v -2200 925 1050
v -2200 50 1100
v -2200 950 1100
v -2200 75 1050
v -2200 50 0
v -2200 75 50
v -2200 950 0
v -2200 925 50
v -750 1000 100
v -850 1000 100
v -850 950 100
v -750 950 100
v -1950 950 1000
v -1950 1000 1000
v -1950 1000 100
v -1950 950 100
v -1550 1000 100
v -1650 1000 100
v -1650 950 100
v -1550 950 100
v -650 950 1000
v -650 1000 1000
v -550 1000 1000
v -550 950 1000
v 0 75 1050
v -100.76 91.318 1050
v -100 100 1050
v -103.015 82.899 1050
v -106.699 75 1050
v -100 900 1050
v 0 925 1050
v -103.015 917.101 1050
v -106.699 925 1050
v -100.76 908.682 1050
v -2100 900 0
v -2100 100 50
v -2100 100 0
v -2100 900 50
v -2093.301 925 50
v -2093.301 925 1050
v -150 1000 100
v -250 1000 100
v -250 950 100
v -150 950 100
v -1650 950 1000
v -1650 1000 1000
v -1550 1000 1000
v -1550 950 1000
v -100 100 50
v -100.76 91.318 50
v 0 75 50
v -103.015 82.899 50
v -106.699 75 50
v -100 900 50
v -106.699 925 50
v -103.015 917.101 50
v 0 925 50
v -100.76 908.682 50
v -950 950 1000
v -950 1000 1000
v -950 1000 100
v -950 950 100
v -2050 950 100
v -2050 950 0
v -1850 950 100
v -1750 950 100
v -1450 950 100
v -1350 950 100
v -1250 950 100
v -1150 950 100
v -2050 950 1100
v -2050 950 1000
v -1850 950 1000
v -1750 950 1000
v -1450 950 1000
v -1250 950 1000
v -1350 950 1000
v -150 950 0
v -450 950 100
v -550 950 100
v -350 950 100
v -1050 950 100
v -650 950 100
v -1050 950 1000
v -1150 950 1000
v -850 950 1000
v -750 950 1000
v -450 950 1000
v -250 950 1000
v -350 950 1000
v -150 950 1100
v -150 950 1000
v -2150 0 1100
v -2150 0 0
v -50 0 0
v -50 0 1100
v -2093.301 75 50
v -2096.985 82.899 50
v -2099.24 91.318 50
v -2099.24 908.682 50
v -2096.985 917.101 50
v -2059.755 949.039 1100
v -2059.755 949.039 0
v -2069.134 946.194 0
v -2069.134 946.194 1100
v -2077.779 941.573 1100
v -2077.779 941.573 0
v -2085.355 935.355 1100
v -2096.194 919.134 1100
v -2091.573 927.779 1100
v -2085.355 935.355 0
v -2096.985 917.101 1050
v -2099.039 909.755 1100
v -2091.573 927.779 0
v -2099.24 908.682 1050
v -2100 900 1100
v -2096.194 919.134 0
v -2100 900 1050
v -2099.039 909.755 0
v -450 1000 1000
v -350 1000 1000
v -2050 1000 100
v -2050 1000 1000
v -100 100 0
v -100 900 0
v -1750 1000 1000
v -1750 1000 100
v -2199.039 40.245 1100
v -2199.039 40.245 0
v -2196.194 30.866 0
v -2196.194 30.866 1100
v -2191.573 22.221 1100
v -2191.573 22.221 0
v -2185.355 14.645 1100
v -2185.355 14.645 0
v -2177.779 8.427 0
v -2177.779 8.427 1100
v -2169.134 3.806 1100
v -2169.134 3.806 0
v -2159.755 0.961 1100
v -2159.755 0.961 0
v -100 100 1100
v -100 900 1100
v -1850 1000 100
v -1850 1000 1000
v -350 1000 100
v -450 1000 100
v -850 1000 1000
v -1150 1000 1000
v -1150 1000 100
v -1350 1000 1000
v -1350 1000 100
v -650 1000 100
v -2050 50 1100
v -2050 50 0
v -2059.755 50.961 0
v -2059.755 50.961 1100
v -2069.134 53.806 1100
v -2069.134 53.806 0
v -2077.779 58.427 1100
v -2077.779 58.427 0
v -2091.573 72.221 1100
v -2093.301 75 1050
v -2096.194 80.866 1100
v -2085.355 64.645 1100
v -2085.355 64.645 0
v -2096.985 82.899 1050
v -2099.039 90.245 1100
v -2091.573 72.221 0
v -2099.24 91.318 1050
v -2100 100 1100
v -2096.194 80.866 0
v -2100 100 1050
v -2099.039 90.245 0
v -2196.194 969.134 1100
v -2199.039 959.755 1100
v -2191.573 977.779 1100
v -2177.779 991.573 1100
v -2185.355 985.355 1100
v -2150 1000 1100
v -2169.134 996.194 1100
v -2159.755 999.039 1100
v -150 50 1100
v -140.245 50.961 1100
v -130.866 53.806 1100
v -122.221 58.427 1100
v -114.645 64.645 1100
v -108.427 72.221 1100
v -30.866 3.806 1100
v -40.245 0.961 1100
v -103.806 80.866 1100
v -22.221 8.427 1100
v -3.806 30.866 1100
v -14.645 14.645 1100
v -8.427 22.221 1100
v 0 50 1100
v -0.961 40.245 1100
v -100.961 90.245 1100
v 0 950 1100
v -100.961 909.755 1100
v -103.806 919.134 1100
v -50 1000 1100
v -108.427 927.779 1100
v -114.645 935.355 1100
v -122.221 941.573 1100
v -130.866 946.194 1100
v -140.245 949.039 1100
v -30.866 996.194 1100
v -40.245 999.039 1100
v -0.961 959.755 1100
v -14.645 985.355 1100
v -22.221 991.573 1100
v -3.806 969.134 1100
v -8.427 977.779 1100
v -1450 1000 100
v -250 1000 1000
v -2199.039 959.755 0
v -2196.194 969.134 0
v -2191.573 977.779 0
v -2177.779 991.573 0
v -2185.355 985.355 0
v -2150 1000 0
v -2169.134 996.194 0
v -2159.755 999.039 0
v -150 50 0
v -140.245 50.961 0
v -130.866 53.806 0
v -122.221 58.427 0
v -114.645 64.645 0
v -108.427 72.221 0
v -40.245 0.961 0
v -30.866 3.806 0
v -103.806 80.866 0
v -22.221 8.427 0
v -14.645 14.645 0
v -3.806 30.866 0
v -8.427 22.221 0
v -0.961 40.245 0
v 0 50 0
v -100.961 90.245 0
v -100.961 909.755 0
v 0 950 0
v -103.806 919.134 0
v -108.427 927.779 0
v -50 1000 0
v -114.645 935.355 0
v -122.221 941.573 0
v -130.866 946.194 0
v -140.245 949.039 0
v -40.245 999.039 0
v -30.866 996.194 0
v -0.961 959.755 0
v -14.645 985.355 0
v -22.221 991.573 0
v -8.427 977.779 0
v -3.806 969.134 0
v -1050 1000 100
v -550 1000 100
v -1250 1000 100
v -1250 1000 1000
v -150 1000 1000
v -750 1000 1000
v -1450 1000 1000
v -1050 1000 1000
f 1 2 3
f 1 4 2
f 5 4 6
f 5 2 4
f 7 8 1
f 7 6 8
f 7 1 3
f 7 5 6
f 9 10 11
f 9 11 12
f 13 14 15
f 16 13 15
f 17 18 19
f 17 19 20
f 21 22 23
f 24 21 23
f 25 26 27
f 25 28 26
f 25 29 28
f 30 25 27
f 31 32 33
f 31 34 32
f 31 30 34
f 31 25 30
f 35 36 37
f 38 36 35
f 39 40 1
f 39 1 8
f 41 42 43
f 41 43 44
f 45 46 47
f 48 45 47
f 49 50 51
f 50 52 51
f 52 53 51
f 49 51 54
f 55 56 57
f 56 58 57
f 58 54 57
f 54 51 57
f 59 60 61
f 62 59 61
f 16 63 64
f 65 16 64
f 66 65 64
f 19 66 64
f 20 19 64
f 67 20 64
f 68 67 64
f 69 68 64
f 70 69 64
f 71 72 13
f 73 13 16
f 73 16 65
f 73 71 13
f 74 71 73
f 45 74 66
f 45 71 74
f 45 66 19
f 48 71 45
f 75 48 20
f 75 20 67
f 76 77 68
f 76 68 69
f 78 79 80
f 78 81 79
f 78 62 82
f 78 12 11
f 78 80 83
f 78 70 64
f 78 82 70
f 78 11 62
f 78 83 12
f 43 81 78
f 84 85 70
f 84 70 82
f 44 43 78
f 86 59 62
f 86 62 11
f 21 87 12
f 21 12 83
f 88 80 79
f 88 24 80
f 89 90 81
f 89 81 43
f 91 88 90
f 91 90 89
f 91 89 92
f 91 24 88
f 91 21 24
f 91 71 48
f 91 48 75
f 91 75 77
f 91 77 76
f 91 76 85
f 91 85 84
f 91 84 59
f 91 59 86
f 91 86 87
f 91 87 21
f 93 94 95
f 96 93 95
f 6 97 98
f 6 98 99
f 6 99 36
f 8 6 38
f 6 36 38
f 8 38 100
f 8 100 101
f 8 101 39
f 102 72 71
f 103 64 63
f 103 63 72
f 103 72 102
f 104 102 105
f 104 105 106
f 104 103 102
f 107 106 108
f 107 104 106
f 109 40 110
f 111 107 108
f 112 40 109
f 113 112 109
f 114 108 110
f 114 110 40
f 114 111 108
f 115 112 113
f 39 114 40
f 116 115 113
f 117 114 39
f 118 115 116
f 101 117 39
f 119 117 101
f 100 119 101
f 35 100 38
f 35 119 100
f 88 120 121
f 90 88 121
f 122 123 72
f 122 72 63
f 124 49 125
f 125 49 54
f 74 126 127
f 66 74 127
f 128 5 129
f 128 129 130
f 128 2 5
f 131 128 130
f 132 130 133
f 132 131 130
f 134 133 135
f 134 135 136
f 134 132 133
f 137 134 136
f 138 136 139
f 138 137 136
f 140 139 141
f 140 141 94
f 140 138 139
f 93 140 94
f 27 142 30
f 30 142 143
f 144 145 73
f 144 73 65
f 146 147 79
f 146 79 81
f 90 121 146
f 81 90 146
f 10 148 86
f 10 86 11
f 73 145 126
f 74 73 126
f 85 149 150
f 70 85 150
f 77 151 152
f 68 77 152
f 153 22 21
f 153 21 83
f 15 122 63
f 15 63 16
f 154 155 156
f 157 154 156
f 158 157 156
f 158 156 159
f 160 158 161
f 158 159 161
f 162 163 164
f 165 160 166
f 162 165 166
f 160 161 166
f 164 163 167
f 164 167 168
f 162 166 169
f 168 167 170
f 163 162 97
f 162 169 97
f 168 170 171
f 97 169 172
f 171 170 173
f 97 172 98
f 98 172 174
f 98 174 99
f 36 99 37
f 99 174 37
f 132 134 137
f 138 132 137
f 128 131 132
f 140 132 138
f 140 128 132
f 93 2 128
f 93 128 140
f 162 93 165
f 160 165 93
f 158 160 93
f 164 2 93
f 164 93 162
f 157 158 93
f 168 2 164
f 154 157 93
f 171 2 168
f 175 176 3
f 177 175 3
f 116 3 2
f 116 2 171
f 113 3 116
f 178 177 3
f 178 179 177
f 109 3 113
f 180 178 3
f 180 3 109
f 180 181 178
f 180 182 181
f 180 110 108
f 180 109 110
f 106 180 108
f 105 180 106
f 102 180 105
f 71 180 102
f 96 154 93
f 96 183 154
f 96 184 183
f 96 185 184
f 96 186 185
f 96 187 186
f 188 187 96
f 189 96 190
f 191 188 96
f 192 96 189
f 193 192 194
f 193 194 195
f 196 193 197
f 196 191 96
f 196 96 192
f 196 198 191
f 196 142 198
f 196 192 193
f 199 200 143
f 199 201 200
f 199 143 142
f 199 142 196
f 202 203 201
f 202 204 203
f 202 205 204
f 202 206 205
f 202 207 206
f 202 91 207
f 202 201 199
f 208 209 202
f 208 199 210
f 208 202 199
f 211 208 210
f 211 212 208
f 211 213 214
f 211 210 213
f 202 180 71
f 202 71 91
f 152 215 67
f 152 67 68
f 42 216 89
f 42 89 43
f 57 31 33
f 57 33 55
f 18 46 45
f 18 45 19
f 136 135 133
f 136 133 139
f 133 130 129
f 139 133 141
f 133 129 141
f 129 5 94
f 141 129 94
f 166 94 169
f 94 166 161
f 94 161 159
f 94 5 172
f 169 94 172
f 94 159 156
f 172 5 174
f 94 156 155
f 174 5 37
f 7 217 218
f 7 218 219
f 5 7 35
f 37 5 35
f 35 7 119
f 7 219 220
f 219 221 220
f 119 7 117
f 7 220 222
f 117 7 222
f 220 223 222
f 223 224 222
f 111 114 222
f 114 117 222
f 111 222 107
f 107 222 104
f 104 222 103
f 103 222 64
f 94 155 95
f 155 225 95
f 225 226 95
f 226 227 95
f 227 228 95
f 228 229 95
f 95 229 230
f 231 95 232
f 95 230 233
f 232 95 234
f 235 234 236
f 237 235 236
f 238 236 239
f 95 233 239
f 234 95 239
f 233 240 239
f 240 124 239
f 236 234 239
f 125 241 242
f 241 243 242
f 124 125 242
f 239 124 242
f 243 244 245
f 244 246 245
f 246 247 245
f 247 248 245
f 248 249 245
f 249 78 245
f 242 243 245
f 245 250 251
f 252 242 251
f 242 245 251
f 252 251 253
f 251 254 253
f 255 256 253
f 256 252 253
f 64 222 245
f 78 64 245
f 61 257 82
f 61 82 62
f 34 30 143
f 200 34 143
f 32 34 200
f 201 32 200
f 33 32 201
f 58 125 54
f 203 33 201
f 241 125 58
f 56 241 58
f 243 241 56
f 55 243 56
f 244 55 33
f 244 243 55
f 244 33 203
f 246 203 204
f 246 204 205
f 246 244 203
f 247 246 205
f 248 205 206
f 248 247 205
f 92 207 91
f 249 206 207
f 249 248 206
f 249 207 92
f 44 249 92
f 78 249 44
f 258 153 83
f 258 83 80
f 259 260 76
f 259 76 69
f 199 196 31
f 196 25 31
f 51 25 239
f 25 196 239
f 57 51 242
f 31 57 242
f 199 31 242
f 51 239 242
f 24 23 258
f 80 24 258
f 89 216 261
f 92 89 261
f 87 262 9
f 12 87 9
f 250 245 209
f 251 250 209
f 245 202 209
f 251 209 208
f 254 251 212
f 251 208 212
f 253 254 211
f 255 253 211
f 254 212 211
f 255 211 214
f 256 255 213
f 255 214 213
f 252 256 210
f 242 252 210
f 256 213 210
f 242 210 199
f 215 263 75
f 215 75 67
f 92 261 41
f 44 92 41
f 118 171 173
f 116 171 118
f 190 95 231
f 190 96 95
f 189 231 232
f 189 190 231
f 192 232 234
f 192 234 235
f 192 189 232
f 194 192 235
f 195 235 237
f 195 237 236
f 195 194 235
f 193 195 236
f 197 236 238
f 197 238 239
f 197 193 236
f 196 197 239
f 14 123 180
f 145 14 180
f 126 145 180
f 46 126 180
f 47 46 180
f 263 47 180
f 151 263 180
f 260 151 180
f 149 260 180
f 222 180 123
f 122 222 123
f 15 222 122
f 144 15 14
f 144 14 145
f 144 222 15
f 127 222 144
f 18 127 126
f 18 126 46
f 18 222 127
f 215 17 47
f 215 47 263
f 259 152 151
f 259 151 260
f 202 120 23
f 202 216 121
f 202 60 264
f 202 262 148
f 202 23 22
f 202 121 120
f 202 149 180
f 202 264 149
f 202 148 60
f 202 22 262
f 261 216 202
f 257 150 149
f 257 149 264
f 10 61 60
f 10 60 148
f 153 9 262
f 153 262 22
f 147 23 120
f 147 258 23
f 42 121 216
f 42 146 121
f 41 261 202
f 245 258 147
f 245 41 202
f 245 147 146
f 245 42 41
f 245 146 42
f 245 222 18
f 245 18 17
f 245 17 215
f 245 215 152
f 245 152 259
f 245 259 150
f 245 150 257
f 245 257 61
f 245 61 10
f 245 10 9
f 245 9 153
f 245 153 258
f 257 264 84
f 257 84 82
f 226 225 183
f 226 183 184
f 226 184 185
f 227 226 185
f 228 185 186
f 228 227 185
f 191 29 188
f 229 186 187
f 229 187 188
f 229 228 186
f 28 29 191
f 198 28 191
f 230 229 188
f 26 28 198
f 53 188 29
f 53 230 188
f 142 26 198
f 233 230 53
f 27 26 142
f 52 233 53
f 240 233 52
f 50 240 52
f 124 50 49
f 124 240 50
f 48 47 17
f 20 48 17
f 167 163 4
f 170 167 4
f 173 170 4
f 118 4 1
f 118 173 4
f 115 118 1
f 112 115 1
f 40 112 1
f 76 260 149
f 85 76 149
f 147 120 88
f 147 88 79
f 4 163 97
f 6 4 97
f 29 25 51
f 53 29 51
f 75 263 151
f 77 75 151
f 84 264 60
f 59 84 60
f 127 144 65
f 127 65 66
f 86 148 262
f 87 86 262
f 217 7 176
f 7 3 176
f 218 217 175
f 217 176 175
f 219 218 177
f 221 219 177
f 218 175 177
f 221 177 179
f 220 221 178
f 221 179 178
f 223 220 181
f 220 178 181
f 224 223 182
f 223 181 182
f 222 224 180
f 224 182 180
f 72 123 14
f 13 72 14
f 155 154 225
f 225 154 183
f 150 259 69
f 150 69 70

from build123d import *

# Parameters (mm, degrees)
SKETCH1_W               = 2200
SKETCH1_H               = 1000
BOSS_EXTRUDE1_DEPTH     = 1100
SKETCH2_W               = 2000
SKETCH2_H               = 900
CUT_EXTRUDE1_DEPTH      = 1
CUT_EXTRUDE1_DEPTH_BACK = 1101
FILLET1_R               = 50
CUT_EXTRUDE2_REACH      = 1002
SKETCH3_W               = 100
SKETCH3_H               = 900
SKETCH4_W               = 1000
SKETCH4_H               = 850
CUT_EXTRUDE3_DEPTH      = 1
CUT_EXTRUDE3_DEPTH_BACK = 2201


with BuildPart() as part:
    # Sketch1 → Boss-Extrude1 (new body)
    with BuildSketch(Plane.XY):
        with Locations((-1100, 500)):
            Rectangle(SKETCH1_W, SKETCH1_H)
    extrude(amount=BOSS_EXTRUDE1_DEPTH)

    # Sketch2 → Cut-Extrude1 (cut, two sides)
    with BuildSketch(Plane.XY.offset(1100)) as cut_extrude1_sk:
        with Locations((-1100, 500)):
            Rectangle(SKETCH2_W, SKETCH2_H)
    extrude(amount=CUT_EXTRUDE1_DEPTH, mode=Mode.SUBTRACT)
    extrude(cut_extrude1_sk.sketch, amount=-CUT_EXTRUDE1_DEPTH_BACK, mode=Mode.SUBTRACT)

    # Fillet1
    fillet1_edges = [part.edges().sort_by_distance(p)[0] for p in [
        (-2100, 50, 550),
        (-2100, 950, 550),
        (-100, 950, 550),
        (-100, 50, 550),
        (0, 0, 550),
        (-2200, 0, 550),
        (-2200, 1000, 550),
        (0, 1000, 550),
    ]]
    fillet(fillet1_edges, radius=FILLET1_R)

    # Sketch3 → Cut-Extrude2 (cut, up to next)
    with BuildSketch(Plane(origin=(0, 1000, 0), x_dir=(1, 0, 0), z_dir=(0, 1, 0)), mode=Mode.PRIVATE) as cut_extrude2_sk1:
        with Locations((-2000, -550)):
            Rectangle(SKETCH3_W, SKETCH3_H)
    cut_extrude2_tool1 = extrude(cut_extrude2_sk1.sketch, amount=-CUT_EXTRUDE2_REACH, mode=Mode.PRIVATE) & part.part
    add(cut_extrude2_tool1.solids().sort_by_distance((-2000, 1000, 550))[0], mode=Mode.SUBTRACT)
    # Sketch3 → Cut-Extrude2 (cut, up to next)
    with BuildSketch(Plane(origin=(0, 1000, 0), x_dir=(1, 0, 0), z_dir=(0, 1, 0)), mode=Mode.PRIVATE) as cut_extrude2_sk2:
        with Locations((-1800, -550)):
            Rectangle(SKETCH3_W, SKETCH3_H)
    cut_extrude2_tool2 = extrude(cut_extrude2_sk2.sketch, amount=-CUT_EXTRUDE2_REACH, mode=Mode.PRIVATE) & part.part
    add(cut_extrude2_tool2.solids().sort_by_distance((-1800, 1000, 550))[0], mode=Mode.SUBTRACT)
    # Sketch3 → Cut-Extrude2 (cut, up to next)
    with BuildSketch(Plane(origin=(0, 1000, 0), x_dir=(1, 0, 0), z_dir=(0, 1, 0)), mode=Mode.PRIVATE) as cut_extrude2_sk3:
        with Locations((-1600, -550)):
            Rectangle(SKETCH3_W, SKETCH3_H)
    cut_extrude2_tool3 = extrude(cut_extrude2_sk3.sketch, amount=-CUT_EXTRUDE2_REACH, mode=Mode.PRIVATE) & part.part
    add(cut_extrude2_tool3.solids().sort_by_distance((-1600, 1000, 550))[0], mode=Mode.SUBTRACT)
    # Sketch3 → Cut-Extrude2 (cut, up to next)
    with BuildSketch(Plane(origin=(0, 1000, 0), x_dir=(1, 0, 0), z_dir=(0, 1, 0)), mode=Mode.PRIVATE) as cut_extrude2_sk4:
        with Locations((-1400, -550)):
            Rectangle(SKETCH3_W, SKETCH3_H)
    cut_extrude2_tool4 = extrude(cut_extrude2_sk4.sketch, amount=-CUT_EXTRUDE2_REACH, mode=Mode.PRIVATE) & part.part
    add(cut_extrude2_tool4.solids().sort_by_distance((-1400, 1000, 550))[0], mode=Mode.SUBTRACT)
    # Sketch3 → Cut-Extrude2 (cut, up to next)
    with BuildSketch(Plane(origin=(0, 1000, 0), x_dir=(1, 0, 0), z_dir=(0, 1, 0)), mode=Mode.PRIVATE) as cut_extrude2_sk5:
        with Locations((-1200, -550)):
            Rectangle(SKETCH3_W, SKETCH3_H)
    cut_extrude2_tool5 = extrude(cut_extrude2_sk5.sketch, amount=-CUT_EXTRUDE2_REACH, mode=Mode.PRIVATE) & part.part
    add(cut_extrude2_tool5.solids().sort_by_distance((-1200, 1000, 550))[0], mode=Mode.SUBTRACT)
    # Sketch3 → Cut-Extrude2 (cut, up to next)
    with BuildSketch(Plane(origin=(0, 1000, 0), x_dir=(1, 0, 0), z_dir=(0, 1, 0)), mode=Mode.PRIVATE) as cut_extrude2_sk6:
        with Locations((-1000, -550)):
            Rectangle(SKETCH3_W, SKETCH3_H)
    cut_extrude2_tool6 = extrude(cut_extrude2_sk6.sketch, amount=-CUT_EXTRUDE2_REACH, mode=Mode.PRIVATE) & part.part
    add(cut_extrude2_tool6.solids().sort_by_distance((-1000, 1000, 550))[0], mode=Mode.SUBTRACT)
    # Sketch3 → Cut-Extrude2 (cut, up to next)
    with BuildSketch(Plane(origin=(0, 1000, 0), x_dir=(1, 0, 0), z_dir=(0, 1, 0)), mode=Mode.PRIVATE) as cut_extrude2_sk7:
        with Locations((-800, -550)):
            Rectangle(SKETCH3_W, SKETCH3_H)
    cut_extrude2_tool7 = extrude(cut_extrude2_sk7.sketch, amount=-CUT_EXTRUDE2_REACH, mode=Mode.PRIVATE) & part.part
    add(cut_extrude2_tool7.solids().sort_by_distance((-800, 1000, 550))[0], mode=Mode.SUBTRACT)
    # Sketch3 → Cut-Extrude2 (cut, up to next)
    with BuildSketch(Plane(origin=(0, 1000, 0), x_dir=(1, 0, 0), z_dir=(0, 1, 0)), mode=Mode.PRIVATE) as cut_extrude2_sk8:
        with Locations((-600, -550)):
            Rectangle(SKETCH3_W, SKETCH3_H)
    cut_extrude2_tool8 = extrude(cut_extrude2_sk8.sketch, amount=-CUT_EXTRUDE2_REACH, mode=Mode.PRIVATE) & part.part
    add(cut_extrude2_tool8.solids().sort_by_distance((-600, 1000, 550))[0], mode=Mode.SUBTRACT)
    # Sketch3 → Cut-Extrude2 (cut, up to next)
    with BuildSketch(Plane(origin=(0, 1000, 0), x_dir=(1, 0, 0), z_dir=(0, 1, 0)), mode=Mode.PRIVATE) as cut_extrude2_sk9:
        with Locations((-400, -550)):
            Rectangle(SKETCH3_W, SKETCH3_H)
    cut_extrude2_tool9 = extrude(cut_extrude2_sk9.sketch, amount=-CUT_EXTRUDE2_REACH, mode=Mode.PRIVATE) & part.part
    add(cut_extrude2_tool9.solids().sort_by_distance((-400, 1000, 550))[0], mode=Mode.SUBTRACT)
    # Sketch3 → Cut-Extrude2 (cut, up to next)
    with BuildSketch(Plane(origin=(0, 1000, 0), x_dir=(1, 0, 0), z_dir=(0, 1, 0)), mode=Mode.PRIVATE) as cut_extrude2_sk10:
        with Locations((-200, -550)):
            Rectangle(SKETCH3_W, SKETCH3_H)
    cut_extrude2_tool10 = extrude(cut_extrude2_sk10.sketch, amount=-CUT_EXTRUDE2_REACH, mode=Mode.PRIVATE) & part.part
    add(cut_extrude2_tool10.solids().sort_by_distance((-200, 1000, 550))[0], mode=Mode.SUBTRACT)

    # Sketch4 → Cut-Extrude3 (cut, two sides)
    with BuildSketch(Plane(origin=(0, 0, 0), x_dir=(0, 0, -1), z_dir=(1, 0, 0))) as cut_extrude3_sk:
        with Locations((-550, 500)):
            Rectangle(SKETCH4_W, SKETCH4_H)
    extrude(amount=CUT_EXTRUDE3_DEPTH, mode=Mode.SUBTRACT)
    extrude(cut_extrude3_sk.sketch, amount=-CUT_EXTRUDE3_DEPTH_BACK, mode=Mode.SUBTRACT)


solid = part.part
